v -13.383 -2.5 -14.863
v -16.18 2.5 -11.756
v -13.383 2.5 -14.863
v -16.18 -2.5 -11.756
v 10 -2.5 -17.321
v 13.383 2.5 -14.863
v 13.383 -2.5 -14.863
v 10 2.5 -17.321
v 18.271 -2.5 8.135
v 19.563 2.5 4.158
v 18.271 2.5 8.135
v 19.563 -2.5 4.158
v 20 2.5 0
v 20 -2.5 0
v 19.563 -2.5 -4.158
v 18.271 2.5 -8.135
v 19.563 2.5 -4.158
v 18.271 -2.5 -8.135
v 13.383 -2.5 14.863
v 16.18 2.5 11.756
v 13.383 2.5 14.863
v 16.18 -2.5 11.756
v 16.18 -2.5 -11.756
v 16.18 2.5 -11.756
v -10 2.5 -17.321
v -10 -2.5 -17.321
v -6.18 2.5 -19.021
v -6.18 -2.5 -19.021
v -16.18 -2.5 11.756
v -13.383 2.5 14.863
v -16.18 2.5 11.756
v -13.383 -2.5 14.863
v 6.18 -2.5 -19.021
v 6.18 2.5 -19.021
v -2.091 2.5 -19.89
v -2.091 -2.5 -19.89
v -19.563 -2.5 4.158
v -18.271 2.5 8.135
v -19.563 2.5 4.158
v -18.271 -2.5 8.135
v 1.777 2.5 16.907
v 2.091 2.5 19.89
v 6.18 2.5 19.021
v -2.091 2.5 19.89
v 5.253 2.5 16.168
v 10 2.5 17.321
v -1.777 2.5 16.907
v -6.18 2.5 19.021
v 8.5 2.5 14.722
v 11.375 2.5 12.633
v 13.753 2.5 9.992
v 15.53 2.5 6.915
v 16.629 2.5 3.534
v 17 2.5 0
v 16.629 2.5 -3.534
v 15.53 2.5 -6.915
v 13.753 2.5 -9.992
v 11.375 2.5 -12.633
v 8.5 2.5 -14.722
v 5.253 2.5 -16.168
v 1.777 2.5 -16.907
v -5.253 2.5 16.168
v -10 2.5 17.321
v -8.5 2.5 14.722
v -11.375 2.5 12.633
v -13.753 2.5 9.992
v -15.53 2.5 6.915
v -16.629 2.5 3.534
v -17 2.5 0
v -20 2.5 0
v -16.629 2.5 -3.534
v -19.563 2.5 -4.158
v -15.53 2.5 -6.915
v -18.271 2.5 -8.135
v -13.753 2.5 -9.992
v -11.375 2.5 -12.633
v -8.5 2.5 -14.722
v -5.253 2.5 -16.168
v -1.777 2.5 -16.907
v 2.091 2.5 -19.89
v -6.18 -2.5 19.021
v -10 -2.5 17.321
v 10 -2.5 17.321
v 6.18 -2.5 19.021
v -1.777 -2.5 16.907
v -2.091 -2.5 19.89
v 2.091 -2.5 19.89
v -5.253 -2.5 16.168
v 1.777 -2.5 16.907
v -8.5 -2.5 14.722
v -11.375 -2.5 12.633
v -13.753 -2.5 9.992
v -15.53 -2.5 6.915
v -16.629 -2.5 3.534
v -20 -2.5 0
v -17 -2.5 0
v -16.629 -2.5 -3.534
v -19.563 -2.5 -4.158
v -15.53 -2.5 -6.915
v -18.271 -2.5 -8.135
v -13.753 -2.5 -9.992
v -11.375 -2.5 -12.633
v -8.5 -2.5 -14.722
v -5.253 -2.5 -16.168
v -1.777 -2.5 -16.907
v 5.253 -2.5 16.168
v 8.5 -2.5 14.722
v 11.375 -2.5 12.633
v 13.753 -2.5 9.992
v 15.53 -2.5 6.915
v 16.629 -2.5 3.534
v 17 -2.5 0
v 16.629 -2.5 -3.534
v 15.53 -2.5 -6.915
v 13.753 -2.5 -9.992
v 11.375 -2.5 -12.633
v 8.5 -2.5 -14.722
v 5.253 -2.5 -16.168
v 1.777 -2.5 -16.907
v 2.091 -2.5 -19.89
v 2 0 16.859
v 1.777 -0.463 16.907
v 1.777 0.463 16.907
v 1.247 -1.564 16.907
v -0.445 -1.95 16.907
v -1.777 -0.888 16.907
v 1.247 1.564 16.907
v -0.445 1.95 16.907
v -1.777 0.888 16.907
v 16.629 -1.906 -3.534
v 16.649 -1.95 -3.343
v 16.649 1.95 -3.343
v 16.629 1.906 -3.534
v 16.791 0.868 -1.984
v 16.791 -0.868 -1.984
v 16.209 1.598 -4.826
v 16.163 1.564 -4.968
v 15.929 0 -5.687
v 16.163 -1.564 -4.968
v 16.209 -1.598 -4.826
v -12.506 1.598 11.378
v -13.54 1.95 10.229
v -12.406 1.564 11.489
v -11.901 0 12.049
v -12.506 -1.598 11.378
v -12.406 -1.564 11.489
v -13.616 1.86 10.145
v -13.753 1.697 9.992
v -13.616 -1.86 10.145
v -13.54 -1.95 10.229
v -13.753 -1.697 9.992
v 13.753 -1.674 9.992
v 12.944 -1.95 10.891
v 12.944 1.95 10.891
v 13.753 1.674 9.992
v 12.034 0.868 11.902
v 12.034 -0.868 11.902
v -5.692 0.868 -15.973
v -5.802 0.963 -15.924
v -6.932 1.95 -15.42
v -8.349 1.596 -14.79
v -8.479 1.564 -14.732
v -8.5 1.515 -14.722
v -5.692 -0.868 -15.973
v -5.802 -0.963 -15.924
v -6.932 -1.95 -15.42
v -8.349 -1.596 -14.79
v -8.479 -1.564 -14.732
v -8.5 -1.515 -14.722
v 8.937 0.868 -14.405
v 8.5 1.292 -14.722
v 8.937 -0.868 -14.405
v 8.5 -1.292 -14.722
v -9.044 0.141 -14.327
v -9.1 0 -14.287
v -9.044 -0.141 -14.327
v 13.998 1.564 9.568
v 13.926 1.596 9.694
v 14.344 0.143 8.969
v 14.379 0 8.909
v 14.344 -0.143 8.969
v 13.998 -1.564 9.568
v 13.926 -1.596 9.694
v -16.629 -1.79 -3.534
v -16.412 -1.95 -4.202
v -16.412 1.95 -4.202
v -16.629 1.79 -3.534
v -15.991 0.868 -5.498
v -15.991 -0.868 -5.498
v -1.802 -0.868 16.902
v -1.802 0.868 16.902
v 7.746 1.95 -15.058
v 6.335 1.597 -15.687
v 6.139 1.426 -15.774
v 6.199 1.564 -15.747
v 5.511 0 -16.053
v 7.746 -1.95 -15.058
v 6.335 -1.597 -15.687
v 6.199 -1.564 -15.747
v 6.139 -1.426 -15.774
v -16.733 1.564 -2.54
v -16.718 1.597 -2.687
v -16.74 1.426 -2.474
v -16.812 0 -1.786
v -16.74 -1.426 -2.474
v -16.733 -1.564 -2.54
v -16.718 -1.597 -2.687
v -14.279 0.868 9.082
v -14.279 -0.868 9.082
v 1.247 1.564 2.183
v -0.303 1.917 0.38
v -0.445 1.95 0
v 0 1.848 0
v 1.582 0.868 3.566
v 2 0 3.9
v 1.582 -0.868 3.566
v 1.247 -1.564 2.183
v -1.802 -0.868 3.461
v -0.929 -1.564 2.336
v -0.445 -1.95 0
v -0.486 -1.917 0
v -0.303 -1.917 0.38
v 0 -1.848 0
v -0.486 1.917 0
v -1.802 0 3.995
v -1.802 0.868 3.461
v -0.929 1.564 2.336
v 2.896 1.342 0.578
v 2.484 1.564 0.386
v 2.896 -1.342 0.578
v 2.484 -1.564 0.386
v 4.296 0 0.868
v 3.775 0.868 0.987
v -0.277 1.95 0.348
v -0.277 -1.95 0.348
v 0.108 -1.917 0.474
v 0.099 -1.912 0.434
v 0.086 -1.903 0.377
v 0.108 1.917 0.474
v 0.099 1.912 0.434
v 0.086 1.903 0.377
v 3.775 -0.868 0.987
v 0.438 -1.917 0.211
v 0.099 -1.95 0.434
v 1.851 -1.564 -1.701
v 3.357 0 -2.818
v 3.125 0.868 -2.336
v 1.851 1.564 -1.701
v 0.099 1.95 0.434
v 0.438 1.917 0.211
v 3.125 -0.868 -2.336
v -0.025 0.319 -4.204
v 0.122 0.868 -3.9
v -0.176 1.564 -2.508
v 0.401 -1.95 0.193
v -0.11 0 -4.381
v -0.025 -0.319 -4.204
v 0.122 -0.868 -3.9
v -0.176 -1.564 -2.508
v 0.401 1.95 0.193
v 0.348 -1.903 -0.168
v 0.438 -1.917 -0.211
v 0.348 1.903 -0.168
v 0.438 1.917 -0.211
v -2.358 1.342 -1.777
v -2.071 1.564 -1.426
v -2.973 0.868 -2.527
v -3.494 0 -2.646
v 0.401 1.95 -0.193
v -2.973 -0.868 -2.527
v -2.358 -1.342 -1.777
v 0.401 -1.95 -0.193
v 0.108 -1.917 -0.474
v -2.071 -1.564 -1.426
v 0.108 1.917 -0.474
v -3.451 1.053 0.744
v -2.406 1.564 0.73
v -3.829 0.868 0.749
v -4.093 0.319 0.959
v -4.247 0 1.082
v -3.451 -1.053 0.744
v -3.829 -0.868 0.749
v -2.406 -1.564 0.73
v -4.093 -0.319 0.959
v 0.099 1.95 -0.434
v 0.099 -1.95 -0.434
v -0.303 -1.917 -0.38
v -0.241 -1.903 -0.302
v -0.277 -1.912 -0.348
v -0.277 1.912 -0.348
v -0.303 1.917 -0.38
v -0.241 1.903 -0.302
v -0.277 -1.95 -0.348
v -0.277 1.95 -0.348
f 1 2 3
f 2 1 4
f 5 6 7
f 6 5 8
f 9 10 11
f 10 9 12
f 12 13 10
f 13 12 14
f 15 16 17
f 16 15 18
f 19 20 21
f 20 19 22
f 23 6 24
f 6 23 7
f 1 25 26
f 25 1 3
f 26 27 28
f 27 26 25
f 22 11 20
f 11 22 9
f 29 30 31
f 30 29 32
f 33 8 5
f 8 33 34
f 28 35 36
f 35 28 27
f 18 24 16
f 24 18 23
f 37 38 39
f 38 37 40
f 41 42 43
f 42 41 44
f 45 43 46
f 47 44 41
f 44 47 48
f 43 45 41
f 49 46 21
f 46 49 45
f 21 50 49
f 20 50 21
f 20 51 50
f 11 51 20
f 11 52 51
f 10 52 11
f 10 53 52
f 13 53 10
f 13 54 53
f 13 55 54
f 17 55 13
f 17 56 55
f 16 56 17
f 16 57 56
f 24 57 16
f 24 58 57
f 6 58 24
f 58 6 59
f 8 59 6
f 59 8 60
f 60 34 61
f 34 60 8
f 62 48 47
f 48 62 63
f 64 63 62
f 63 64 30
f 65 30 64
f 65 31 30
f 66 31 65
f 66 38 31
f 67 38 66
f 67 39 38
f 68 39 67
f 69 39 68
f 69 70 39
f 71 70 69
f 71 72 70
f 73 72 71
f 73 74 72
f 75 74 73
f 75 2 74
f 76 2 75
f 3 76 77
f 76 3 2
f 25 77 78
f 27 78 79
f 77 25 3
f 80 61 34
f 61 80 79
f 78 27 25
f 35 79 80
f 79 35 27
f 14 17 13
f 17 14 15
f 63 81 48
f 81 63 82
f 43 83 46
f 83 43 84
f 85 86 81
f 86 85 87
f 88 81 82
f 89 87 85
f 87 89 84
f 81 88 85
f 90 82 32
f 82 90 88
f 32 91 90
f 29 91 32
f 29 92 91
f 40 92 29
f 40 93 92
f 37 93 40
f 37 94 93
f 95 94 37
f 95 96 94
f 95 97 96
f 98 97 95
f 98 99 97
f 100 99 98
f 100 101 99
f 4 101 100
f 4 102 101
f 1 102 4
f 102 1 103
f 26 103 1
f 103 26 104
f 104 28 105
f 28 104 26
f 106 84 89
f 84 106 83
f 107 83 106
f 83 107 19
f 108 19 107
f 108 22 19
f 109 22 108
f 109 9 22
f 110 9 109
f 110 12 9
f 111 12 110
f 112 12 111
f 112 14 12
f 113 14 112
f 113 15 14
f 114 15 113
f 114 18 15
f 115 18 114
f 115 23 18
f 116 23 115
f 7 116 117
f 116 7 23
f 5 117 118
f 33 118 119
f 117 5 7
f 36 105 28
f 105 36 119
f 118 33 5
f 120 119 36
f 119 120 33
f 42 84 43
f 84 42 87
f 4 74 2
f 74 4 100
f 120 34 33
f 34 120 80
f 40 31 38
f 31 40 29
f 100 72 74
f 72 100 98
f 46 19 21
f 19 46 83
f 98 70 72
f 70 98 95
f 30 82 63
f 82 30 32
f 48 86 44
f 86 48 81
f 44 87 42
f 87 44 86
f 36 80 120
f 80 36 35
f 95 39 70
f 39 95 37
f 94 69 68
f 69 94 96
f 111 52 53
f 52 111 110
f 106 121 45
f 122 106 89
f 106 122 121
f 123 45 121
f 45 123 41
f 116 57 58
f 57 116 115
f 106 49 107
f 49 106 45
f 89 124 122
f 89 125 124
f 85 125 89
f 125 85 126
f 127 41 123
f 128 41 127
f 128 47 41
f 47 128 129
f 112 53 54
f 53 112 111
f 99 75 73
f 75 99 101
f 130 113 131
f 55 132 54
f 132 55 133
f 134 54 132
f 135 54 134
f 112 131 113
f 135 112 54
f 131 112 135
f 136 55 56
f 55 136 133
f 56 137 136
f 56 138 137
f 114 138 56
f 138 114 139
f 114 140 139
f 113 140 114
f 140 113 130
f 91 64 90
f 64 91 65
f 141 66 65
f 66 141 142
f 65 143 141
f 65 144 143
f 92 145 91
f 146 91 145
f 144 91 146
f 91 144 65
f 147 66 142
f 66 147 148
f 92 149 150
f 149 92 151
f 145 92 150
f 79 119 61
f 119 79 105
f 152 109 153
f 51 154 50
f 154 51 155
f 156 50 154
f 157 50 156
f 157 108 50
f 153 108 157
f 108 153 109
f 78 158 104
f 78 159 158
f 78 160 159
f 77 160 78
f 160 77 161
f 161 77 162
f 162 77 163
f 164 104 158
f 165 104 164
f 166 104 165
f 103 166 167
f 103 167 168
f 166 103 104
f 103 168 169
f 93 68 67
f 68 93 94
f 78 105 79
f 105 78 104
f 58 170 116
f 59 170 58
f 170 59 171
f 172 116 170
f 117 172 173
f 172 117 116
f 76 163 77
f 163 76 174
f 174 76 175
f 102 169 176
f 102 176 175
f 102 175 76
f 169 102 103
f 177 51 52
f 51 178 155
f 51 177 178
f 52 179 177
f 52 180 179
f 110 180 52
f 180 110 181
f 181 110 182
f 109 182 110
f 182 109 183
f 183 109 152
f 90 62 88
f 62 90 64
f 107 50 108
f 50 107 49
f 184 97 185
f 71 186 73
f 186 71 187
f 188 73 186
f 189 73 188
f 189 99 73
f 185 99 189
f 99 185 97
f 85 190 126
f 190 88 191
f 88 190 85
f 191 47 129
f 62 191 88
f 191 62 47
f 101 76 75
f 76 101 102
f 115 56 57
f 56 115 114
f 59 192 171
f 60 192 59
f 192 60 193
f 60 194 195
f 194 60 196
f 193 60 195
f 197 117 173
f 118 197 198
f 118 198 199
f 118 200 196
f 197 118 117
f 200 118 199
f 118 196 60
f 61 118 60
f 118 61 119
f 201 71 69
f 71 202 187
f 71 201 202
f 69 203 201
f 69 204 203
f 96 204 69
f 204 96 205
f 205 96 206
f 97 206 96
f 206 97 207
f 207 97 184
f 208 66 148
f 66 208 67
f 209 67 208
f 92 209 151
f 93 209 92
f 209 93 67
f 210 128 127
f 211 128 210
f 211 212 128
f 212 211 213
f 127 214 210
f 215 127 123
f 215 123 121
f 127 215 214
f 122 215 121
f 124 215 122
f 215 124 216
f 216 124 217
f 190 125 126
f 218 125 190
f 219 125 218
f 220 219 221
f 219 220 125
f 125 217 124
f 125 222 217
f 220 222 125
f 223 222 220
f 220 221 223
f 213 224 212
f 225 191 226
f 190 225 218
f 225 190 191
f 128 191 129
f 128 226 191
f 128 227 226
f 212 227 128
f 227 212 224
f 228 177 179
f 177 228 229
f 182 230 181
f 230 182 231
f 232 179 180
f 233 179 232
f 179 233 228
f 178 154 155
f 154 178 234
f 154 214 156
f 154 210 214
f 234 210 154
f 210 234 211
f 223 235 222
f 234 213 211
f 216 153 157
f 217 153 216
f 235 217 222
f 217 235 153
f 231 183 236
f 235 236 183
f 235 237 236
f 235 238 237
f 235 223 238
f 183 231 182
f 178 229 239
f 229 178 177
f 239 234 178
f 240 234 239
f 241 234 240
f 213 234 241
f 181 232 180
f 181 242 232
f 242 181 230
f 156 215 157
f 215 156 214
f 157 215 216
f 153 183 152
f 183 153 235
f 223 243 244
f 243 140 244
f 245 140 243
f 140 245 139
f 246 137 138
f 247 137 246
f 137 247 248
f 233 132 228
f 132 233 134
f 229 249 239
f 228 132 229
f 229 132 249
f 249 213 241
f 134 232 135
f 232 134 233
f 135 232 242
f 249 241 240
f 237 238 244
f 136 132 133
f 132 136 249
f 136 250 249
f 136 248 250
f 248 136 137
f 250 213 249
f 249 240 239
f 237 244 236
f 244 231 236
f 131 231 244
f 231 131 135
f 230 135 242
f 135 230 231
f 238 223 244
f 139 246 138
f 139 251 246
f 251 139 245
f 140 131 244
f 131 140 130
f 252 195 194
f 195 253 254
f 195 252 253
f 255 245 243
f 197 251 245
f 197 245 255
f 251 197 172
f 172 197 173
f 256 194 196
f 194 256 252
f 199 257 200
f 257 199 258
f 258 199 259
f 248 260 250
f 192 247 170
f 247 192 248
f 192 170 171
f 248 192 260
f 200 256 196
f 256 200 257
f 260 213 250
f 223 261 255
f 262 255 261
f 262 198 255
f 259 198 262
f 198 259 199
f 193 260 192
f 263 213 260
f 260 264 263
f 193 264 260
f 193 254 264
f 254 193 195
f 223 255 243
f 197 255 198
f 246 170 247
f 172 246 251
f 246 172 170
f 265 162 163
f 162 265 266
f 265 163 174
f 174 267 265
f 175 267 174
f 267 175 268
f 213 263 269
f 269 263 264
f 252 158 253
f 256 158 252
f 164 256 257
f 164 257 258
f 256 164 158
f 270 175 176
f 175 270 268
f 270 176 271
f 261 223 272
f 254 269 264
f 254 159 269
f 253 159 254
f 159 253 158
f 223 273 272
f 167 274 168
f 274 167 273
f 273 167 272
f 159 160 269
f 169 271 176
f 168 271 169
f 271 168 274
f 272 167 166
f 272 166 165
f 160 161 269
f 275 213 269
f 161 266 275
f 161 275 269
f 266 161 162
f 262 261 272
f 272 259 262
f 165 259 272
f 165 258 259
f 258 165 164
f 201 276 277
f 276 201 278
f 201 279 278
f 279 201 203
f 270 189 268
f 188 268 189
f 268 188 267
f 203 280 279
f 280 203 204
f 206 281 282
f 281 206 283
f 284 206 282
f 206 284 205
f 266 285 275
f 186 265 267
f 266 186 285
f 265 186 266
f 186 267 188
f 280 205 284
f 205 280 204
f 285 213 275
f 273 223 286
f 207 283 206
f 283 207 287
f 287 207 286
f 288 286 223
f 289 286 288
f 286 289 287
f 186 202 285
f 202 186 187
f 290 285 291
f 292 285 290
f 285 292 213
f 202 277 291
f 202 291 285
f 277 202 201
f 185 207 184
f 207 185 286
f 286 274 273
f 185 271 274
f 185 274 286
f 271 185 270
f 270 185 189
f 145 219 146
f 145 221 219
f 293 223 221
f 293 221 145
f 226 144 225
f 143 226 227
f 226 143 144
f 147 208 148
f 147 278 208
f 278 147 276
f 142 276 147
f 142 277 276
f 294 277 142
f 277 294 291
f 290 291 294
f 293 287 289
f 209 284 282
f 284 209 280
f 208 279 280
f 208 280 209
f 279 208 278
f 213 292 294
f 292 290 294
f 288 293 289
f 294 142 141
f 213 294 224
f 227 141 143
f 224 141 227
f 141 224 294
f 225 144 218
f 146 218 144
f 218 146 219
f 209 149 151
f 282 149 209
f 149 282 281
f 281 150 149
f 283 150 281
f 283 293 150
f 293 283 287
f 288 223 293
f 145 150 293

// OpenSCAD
module spoked_wheel(radius=20,thickness=3,width=5,number_of_spokes=7,spoke_radius=2) {
    inner_radius=radius-thickness;
    difference() {
        rotate([90,0,0])
            cylinder(h=width,r=radius,center=true);
        rotate([90,0,0])
            cylinder(h=width+1,r=inner_radius,center=true);
    }
    spoke_length=radius-thickness/2;
    for(i=[0:1:number_of_spokes-1]) {
        angle=i*(360/number_of_spokes);
        rotate([0,angle,0])
            cylinder(h=spoke_length, r=spoke_radius);
    }
}
spoked_wheel();
